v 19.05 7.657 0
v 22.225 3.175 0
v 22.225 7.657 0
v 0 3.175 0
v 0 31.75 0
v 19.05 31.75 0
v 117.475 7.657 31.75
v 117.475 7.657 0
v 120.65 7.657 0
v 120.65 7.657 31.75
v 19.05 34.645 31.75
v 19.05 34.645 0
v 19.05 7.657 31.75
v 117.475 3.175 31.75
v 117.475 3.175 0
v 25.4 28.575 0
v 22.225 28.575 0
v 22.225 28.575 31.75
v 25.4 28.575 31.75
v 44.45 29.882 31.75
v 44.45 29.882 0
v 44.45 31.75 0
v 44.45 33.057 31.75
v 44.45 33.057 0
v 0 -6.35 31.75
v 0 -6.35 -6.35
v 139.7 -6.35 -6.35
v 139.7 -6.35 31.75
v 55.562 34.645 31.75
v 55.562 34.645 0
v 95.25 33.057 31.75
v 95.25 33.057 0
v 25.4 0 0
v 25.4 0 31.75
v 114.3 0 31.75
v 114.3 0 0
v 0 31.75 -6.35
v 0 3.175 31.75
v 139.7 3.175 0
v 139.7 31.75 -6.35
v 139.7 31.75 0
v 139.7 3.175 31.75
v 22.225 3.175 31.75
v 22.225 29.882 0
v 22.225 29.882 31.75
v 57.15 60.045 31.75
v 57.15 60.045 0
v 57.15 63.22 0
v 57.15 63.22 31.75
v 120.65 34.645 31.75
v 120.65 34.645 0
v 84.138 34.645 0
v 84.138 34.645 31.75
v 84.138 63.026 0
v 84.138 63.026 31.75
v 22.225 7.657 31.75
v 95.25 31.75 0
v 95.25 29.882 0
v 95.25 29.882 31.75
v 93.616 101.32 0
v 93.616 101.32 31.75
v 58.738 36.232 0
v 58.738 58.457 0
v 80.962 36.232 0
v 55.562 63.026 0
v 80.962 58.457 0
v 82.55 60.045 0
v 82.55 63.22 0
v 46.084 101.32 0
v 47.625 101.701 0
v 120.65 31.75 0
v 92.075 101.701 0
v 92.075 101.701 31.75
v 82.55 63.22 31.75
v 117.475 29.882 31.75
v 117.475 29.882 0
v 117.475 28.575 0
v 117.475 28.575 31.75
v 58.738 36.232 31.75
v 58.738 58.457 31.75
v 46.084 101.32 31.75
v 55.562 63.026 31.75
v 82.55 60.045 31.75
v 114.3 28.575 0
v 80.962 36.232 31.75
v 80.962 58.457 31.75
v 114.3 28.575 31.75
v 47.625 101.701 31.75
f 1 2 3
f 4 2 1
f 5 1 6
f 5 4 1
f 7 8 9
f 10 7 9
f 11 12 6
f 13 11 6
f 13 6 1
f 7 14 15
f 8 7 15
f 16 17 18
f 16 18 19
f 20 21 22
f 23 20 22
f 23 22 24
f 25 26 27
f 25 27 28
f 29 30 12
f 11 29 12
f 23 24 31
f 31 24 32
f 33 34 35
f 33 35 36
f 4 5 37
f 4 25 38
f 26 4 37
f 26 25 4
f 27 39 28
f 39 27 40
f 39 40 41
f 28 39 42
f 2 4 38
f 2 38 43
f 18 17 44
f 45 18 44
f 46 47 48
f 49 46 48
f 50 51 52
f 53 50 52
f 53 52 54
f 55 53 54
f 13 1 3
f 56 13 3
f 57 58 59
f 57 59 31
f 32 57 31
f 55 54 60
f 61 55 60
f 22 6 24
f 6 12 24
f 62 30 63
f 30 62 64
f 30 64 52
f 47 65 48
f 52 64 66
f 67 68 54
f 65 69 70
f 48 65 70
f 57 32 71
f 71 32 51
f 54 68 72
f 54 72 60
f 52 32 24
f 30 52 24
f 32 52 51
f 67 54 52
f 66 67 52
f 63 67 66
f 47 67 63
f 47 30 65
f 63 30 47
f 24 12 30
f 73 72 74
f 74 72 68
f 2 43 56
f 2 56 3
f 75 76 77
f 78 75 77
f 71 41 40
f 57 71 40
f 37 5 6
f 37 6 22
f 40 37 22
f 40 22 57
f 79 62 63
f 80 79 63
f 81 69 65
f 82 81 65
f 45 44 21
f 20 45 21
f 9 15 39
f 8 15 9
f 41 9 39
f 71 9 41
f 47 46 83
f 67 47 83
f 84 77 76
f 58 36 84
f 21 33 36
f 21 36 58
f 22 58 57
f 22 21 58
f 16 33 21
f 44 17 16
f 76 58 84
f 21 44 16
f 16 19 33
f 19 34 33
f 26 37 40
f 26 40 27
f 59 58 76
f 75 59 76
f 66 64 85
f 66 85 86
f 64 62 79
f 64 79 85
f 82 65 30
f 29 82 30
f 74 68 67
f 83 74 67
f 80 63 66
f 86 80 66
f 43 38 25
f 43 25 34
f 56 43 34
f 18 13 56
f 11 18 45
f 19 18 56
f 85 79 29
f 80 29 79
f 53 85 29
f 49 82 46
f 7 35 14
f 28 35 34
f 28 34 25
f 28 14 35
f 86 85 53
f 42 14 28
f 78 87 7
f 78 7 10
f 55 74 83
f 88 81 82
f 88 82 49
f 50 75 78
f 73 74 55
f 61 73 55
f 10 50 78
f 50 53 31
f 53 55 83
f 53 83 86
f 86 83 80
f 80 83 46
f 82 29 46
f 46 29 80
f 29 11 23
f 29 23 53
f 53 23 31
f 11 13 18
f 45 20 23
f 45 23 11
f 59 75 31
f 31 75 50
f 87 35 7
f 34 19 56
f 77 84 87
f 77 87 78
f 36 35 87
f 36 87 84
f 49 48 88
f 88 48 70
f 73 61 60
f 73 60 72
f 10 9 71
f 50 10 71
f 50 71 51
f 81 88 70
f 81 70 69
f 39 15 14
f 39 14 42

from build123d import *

# Parameters (mm, degrees)
BOSS_EXTRUDE1_DEPTH = 139.7
SKETCH2_W           = 25.4
SKETCH2_H           = 31.75
BOSS_EXTRUDE2_DEPTH = 3.175
SKETCH3_W           = 3.175
SKETCH3_H           = 31.75
BOSS_EXTRUDE3_DEPTH = 25.4
SKETCH5_W           = 22.225
SKETCH5_H           = 3.175
SKETCH5_W_2         = 25.4
SKETCH5_H_2         = 25.4
SKETCH5_H_3         = 22.225
BOSS_EXTRUDE4_DEPTH = 31.75


with BuildPart() as part:
    # Sketch1 → Boss-Extrude1 (new body)
    with BuildSketch(Plane(origin=(0, 0, 0), x_dir=(0, 0, -1), z_dir=(1, 0, 0))):
        Polygon((-31.75, 0), (0, 0), (0, 31.75), (6.35, 31.75), (6.35, -6.35), (-31.75, -6.35), align=None)
    extrude(amount=BOSS_EXTRUDE1_DEPTH)

    # Sketch2 → Boss-Extrude2 (add)
    with BuildSketch(Plane(origin=(0, 0, 0), x_dir=(1, 0, 0), z_dir=(0, 1, 0))):
        with Locations((12.7, -15.875)):
            Rectangle(SKETCH2_W, SKETCH2_H)
        with Locations((127, -15.875)):
            Rectangle(SKETCH2_W, SKETCH2_H)
    extrude(amount=BOSS_EXTRUDE2_DEPTH)

    # Sketch3 → Boss-Extrude3 (add)
    with BuildSketch(Plane(origin=(0, 3.175, 0), x_dir=(1, 0, 0), z_dir=(0, 1, 0))):
        with Locations((23.8125, -15.875)):
            Rectangle(SKETCH3_W, SKETCH3_H)
        with Locations((115.8875, -15.875)):
            Rectangle(SKETCH3_W, SKETCH3_H)
    extrude(amount=BOSS_EXTRUDE3_DEPTH)

    # Sketch5 → Boss-Extrude4 (add)
    # profile 1 of 8: a face of its own
    with BuildSketch(Plane.XY):
        Polygon((19.05, 7.657352941), (22.225, 7.657352941), (22.225, 29.882352941), (22.225, 33.057352941), (19.05, 33.057352941), align=None)
    # profile 2 of 8: a face of its own
    with BuildSketch(Plane.XY):
        with Locations((33.3375, 31.469852941)):
            Rectangle(SKETCH5_W, SKETCH5_H)
    # profile 3 of 8: a face of its own
    with BuildSketch(Plane.XY):
        Polygon((19.05, 34.644852941), (19.05, 33.057352941), (22.225, 33.057352941), (44.45, 33.057352941), (95.25, 33.057352941), (117.475, 33.057352941), (120.65, 33.057352941), (120.65, 34.644852941), (84.1375, 34.644852941), (82.55, 34.644852941), (57.15, 34.644852941), (55.5625, 34.644852941), align=None)
    # profile 4 of 8: a face of its own
    with BuildSketch(Plane.XY):
        Polygon((55.5625, 63.026302863), (55.5625, 34.644852941), (57.15, 34.644852941), (57.15, 60.044852941), (57.15, 63.219852941), (47.625, 101.701283211), (46.084004478, 101.319852941), align=None)
    # profile 5 of 8: a face of its own
    with BuildSketch(Plane.XY):
        with Locations((106.3625, 31.469852941)):
            Rectangle(SKETCH5_W, SKETCH5_H)
    # profile 6 of 8: a face of its own
    with BuildSketch(Plane.XY):
        with Locations((69.85, 47.344852941)):
            Rectangle(SKETCH5_W_2, SKETCH5_H_2)
        with Locations((69.85, 47.344852941)):
            Rectangle(SKETCH5_W, SKETCH5_H_3, mode=Mode.SUBTRACT)
    # profile 7 of 8: a face of its own
    with BuildSketch(Plane.XY):
        Polygon((120.65, 33.057352941), (117.475, 33.057352941), (117.475, 29.882352941), (117.475, 7.657352941), (120.65, 7.657352941), align=None)
    # profile 8 of 8: a face of its own
    with BuildSketch(Plane.XY):
        Polygon((82.55, 60.044852941), (82.55, 34.644852941), (84.1375, 34.644852941), (84.1375, 63.026302863), (93.615995522, 101.319852941), (92.075, 101.701283211), (82.55, 63.219852941), align=None)
    extrude(amount=BOSS_EXTRUDE4_DEPTH)


solid = part.part
